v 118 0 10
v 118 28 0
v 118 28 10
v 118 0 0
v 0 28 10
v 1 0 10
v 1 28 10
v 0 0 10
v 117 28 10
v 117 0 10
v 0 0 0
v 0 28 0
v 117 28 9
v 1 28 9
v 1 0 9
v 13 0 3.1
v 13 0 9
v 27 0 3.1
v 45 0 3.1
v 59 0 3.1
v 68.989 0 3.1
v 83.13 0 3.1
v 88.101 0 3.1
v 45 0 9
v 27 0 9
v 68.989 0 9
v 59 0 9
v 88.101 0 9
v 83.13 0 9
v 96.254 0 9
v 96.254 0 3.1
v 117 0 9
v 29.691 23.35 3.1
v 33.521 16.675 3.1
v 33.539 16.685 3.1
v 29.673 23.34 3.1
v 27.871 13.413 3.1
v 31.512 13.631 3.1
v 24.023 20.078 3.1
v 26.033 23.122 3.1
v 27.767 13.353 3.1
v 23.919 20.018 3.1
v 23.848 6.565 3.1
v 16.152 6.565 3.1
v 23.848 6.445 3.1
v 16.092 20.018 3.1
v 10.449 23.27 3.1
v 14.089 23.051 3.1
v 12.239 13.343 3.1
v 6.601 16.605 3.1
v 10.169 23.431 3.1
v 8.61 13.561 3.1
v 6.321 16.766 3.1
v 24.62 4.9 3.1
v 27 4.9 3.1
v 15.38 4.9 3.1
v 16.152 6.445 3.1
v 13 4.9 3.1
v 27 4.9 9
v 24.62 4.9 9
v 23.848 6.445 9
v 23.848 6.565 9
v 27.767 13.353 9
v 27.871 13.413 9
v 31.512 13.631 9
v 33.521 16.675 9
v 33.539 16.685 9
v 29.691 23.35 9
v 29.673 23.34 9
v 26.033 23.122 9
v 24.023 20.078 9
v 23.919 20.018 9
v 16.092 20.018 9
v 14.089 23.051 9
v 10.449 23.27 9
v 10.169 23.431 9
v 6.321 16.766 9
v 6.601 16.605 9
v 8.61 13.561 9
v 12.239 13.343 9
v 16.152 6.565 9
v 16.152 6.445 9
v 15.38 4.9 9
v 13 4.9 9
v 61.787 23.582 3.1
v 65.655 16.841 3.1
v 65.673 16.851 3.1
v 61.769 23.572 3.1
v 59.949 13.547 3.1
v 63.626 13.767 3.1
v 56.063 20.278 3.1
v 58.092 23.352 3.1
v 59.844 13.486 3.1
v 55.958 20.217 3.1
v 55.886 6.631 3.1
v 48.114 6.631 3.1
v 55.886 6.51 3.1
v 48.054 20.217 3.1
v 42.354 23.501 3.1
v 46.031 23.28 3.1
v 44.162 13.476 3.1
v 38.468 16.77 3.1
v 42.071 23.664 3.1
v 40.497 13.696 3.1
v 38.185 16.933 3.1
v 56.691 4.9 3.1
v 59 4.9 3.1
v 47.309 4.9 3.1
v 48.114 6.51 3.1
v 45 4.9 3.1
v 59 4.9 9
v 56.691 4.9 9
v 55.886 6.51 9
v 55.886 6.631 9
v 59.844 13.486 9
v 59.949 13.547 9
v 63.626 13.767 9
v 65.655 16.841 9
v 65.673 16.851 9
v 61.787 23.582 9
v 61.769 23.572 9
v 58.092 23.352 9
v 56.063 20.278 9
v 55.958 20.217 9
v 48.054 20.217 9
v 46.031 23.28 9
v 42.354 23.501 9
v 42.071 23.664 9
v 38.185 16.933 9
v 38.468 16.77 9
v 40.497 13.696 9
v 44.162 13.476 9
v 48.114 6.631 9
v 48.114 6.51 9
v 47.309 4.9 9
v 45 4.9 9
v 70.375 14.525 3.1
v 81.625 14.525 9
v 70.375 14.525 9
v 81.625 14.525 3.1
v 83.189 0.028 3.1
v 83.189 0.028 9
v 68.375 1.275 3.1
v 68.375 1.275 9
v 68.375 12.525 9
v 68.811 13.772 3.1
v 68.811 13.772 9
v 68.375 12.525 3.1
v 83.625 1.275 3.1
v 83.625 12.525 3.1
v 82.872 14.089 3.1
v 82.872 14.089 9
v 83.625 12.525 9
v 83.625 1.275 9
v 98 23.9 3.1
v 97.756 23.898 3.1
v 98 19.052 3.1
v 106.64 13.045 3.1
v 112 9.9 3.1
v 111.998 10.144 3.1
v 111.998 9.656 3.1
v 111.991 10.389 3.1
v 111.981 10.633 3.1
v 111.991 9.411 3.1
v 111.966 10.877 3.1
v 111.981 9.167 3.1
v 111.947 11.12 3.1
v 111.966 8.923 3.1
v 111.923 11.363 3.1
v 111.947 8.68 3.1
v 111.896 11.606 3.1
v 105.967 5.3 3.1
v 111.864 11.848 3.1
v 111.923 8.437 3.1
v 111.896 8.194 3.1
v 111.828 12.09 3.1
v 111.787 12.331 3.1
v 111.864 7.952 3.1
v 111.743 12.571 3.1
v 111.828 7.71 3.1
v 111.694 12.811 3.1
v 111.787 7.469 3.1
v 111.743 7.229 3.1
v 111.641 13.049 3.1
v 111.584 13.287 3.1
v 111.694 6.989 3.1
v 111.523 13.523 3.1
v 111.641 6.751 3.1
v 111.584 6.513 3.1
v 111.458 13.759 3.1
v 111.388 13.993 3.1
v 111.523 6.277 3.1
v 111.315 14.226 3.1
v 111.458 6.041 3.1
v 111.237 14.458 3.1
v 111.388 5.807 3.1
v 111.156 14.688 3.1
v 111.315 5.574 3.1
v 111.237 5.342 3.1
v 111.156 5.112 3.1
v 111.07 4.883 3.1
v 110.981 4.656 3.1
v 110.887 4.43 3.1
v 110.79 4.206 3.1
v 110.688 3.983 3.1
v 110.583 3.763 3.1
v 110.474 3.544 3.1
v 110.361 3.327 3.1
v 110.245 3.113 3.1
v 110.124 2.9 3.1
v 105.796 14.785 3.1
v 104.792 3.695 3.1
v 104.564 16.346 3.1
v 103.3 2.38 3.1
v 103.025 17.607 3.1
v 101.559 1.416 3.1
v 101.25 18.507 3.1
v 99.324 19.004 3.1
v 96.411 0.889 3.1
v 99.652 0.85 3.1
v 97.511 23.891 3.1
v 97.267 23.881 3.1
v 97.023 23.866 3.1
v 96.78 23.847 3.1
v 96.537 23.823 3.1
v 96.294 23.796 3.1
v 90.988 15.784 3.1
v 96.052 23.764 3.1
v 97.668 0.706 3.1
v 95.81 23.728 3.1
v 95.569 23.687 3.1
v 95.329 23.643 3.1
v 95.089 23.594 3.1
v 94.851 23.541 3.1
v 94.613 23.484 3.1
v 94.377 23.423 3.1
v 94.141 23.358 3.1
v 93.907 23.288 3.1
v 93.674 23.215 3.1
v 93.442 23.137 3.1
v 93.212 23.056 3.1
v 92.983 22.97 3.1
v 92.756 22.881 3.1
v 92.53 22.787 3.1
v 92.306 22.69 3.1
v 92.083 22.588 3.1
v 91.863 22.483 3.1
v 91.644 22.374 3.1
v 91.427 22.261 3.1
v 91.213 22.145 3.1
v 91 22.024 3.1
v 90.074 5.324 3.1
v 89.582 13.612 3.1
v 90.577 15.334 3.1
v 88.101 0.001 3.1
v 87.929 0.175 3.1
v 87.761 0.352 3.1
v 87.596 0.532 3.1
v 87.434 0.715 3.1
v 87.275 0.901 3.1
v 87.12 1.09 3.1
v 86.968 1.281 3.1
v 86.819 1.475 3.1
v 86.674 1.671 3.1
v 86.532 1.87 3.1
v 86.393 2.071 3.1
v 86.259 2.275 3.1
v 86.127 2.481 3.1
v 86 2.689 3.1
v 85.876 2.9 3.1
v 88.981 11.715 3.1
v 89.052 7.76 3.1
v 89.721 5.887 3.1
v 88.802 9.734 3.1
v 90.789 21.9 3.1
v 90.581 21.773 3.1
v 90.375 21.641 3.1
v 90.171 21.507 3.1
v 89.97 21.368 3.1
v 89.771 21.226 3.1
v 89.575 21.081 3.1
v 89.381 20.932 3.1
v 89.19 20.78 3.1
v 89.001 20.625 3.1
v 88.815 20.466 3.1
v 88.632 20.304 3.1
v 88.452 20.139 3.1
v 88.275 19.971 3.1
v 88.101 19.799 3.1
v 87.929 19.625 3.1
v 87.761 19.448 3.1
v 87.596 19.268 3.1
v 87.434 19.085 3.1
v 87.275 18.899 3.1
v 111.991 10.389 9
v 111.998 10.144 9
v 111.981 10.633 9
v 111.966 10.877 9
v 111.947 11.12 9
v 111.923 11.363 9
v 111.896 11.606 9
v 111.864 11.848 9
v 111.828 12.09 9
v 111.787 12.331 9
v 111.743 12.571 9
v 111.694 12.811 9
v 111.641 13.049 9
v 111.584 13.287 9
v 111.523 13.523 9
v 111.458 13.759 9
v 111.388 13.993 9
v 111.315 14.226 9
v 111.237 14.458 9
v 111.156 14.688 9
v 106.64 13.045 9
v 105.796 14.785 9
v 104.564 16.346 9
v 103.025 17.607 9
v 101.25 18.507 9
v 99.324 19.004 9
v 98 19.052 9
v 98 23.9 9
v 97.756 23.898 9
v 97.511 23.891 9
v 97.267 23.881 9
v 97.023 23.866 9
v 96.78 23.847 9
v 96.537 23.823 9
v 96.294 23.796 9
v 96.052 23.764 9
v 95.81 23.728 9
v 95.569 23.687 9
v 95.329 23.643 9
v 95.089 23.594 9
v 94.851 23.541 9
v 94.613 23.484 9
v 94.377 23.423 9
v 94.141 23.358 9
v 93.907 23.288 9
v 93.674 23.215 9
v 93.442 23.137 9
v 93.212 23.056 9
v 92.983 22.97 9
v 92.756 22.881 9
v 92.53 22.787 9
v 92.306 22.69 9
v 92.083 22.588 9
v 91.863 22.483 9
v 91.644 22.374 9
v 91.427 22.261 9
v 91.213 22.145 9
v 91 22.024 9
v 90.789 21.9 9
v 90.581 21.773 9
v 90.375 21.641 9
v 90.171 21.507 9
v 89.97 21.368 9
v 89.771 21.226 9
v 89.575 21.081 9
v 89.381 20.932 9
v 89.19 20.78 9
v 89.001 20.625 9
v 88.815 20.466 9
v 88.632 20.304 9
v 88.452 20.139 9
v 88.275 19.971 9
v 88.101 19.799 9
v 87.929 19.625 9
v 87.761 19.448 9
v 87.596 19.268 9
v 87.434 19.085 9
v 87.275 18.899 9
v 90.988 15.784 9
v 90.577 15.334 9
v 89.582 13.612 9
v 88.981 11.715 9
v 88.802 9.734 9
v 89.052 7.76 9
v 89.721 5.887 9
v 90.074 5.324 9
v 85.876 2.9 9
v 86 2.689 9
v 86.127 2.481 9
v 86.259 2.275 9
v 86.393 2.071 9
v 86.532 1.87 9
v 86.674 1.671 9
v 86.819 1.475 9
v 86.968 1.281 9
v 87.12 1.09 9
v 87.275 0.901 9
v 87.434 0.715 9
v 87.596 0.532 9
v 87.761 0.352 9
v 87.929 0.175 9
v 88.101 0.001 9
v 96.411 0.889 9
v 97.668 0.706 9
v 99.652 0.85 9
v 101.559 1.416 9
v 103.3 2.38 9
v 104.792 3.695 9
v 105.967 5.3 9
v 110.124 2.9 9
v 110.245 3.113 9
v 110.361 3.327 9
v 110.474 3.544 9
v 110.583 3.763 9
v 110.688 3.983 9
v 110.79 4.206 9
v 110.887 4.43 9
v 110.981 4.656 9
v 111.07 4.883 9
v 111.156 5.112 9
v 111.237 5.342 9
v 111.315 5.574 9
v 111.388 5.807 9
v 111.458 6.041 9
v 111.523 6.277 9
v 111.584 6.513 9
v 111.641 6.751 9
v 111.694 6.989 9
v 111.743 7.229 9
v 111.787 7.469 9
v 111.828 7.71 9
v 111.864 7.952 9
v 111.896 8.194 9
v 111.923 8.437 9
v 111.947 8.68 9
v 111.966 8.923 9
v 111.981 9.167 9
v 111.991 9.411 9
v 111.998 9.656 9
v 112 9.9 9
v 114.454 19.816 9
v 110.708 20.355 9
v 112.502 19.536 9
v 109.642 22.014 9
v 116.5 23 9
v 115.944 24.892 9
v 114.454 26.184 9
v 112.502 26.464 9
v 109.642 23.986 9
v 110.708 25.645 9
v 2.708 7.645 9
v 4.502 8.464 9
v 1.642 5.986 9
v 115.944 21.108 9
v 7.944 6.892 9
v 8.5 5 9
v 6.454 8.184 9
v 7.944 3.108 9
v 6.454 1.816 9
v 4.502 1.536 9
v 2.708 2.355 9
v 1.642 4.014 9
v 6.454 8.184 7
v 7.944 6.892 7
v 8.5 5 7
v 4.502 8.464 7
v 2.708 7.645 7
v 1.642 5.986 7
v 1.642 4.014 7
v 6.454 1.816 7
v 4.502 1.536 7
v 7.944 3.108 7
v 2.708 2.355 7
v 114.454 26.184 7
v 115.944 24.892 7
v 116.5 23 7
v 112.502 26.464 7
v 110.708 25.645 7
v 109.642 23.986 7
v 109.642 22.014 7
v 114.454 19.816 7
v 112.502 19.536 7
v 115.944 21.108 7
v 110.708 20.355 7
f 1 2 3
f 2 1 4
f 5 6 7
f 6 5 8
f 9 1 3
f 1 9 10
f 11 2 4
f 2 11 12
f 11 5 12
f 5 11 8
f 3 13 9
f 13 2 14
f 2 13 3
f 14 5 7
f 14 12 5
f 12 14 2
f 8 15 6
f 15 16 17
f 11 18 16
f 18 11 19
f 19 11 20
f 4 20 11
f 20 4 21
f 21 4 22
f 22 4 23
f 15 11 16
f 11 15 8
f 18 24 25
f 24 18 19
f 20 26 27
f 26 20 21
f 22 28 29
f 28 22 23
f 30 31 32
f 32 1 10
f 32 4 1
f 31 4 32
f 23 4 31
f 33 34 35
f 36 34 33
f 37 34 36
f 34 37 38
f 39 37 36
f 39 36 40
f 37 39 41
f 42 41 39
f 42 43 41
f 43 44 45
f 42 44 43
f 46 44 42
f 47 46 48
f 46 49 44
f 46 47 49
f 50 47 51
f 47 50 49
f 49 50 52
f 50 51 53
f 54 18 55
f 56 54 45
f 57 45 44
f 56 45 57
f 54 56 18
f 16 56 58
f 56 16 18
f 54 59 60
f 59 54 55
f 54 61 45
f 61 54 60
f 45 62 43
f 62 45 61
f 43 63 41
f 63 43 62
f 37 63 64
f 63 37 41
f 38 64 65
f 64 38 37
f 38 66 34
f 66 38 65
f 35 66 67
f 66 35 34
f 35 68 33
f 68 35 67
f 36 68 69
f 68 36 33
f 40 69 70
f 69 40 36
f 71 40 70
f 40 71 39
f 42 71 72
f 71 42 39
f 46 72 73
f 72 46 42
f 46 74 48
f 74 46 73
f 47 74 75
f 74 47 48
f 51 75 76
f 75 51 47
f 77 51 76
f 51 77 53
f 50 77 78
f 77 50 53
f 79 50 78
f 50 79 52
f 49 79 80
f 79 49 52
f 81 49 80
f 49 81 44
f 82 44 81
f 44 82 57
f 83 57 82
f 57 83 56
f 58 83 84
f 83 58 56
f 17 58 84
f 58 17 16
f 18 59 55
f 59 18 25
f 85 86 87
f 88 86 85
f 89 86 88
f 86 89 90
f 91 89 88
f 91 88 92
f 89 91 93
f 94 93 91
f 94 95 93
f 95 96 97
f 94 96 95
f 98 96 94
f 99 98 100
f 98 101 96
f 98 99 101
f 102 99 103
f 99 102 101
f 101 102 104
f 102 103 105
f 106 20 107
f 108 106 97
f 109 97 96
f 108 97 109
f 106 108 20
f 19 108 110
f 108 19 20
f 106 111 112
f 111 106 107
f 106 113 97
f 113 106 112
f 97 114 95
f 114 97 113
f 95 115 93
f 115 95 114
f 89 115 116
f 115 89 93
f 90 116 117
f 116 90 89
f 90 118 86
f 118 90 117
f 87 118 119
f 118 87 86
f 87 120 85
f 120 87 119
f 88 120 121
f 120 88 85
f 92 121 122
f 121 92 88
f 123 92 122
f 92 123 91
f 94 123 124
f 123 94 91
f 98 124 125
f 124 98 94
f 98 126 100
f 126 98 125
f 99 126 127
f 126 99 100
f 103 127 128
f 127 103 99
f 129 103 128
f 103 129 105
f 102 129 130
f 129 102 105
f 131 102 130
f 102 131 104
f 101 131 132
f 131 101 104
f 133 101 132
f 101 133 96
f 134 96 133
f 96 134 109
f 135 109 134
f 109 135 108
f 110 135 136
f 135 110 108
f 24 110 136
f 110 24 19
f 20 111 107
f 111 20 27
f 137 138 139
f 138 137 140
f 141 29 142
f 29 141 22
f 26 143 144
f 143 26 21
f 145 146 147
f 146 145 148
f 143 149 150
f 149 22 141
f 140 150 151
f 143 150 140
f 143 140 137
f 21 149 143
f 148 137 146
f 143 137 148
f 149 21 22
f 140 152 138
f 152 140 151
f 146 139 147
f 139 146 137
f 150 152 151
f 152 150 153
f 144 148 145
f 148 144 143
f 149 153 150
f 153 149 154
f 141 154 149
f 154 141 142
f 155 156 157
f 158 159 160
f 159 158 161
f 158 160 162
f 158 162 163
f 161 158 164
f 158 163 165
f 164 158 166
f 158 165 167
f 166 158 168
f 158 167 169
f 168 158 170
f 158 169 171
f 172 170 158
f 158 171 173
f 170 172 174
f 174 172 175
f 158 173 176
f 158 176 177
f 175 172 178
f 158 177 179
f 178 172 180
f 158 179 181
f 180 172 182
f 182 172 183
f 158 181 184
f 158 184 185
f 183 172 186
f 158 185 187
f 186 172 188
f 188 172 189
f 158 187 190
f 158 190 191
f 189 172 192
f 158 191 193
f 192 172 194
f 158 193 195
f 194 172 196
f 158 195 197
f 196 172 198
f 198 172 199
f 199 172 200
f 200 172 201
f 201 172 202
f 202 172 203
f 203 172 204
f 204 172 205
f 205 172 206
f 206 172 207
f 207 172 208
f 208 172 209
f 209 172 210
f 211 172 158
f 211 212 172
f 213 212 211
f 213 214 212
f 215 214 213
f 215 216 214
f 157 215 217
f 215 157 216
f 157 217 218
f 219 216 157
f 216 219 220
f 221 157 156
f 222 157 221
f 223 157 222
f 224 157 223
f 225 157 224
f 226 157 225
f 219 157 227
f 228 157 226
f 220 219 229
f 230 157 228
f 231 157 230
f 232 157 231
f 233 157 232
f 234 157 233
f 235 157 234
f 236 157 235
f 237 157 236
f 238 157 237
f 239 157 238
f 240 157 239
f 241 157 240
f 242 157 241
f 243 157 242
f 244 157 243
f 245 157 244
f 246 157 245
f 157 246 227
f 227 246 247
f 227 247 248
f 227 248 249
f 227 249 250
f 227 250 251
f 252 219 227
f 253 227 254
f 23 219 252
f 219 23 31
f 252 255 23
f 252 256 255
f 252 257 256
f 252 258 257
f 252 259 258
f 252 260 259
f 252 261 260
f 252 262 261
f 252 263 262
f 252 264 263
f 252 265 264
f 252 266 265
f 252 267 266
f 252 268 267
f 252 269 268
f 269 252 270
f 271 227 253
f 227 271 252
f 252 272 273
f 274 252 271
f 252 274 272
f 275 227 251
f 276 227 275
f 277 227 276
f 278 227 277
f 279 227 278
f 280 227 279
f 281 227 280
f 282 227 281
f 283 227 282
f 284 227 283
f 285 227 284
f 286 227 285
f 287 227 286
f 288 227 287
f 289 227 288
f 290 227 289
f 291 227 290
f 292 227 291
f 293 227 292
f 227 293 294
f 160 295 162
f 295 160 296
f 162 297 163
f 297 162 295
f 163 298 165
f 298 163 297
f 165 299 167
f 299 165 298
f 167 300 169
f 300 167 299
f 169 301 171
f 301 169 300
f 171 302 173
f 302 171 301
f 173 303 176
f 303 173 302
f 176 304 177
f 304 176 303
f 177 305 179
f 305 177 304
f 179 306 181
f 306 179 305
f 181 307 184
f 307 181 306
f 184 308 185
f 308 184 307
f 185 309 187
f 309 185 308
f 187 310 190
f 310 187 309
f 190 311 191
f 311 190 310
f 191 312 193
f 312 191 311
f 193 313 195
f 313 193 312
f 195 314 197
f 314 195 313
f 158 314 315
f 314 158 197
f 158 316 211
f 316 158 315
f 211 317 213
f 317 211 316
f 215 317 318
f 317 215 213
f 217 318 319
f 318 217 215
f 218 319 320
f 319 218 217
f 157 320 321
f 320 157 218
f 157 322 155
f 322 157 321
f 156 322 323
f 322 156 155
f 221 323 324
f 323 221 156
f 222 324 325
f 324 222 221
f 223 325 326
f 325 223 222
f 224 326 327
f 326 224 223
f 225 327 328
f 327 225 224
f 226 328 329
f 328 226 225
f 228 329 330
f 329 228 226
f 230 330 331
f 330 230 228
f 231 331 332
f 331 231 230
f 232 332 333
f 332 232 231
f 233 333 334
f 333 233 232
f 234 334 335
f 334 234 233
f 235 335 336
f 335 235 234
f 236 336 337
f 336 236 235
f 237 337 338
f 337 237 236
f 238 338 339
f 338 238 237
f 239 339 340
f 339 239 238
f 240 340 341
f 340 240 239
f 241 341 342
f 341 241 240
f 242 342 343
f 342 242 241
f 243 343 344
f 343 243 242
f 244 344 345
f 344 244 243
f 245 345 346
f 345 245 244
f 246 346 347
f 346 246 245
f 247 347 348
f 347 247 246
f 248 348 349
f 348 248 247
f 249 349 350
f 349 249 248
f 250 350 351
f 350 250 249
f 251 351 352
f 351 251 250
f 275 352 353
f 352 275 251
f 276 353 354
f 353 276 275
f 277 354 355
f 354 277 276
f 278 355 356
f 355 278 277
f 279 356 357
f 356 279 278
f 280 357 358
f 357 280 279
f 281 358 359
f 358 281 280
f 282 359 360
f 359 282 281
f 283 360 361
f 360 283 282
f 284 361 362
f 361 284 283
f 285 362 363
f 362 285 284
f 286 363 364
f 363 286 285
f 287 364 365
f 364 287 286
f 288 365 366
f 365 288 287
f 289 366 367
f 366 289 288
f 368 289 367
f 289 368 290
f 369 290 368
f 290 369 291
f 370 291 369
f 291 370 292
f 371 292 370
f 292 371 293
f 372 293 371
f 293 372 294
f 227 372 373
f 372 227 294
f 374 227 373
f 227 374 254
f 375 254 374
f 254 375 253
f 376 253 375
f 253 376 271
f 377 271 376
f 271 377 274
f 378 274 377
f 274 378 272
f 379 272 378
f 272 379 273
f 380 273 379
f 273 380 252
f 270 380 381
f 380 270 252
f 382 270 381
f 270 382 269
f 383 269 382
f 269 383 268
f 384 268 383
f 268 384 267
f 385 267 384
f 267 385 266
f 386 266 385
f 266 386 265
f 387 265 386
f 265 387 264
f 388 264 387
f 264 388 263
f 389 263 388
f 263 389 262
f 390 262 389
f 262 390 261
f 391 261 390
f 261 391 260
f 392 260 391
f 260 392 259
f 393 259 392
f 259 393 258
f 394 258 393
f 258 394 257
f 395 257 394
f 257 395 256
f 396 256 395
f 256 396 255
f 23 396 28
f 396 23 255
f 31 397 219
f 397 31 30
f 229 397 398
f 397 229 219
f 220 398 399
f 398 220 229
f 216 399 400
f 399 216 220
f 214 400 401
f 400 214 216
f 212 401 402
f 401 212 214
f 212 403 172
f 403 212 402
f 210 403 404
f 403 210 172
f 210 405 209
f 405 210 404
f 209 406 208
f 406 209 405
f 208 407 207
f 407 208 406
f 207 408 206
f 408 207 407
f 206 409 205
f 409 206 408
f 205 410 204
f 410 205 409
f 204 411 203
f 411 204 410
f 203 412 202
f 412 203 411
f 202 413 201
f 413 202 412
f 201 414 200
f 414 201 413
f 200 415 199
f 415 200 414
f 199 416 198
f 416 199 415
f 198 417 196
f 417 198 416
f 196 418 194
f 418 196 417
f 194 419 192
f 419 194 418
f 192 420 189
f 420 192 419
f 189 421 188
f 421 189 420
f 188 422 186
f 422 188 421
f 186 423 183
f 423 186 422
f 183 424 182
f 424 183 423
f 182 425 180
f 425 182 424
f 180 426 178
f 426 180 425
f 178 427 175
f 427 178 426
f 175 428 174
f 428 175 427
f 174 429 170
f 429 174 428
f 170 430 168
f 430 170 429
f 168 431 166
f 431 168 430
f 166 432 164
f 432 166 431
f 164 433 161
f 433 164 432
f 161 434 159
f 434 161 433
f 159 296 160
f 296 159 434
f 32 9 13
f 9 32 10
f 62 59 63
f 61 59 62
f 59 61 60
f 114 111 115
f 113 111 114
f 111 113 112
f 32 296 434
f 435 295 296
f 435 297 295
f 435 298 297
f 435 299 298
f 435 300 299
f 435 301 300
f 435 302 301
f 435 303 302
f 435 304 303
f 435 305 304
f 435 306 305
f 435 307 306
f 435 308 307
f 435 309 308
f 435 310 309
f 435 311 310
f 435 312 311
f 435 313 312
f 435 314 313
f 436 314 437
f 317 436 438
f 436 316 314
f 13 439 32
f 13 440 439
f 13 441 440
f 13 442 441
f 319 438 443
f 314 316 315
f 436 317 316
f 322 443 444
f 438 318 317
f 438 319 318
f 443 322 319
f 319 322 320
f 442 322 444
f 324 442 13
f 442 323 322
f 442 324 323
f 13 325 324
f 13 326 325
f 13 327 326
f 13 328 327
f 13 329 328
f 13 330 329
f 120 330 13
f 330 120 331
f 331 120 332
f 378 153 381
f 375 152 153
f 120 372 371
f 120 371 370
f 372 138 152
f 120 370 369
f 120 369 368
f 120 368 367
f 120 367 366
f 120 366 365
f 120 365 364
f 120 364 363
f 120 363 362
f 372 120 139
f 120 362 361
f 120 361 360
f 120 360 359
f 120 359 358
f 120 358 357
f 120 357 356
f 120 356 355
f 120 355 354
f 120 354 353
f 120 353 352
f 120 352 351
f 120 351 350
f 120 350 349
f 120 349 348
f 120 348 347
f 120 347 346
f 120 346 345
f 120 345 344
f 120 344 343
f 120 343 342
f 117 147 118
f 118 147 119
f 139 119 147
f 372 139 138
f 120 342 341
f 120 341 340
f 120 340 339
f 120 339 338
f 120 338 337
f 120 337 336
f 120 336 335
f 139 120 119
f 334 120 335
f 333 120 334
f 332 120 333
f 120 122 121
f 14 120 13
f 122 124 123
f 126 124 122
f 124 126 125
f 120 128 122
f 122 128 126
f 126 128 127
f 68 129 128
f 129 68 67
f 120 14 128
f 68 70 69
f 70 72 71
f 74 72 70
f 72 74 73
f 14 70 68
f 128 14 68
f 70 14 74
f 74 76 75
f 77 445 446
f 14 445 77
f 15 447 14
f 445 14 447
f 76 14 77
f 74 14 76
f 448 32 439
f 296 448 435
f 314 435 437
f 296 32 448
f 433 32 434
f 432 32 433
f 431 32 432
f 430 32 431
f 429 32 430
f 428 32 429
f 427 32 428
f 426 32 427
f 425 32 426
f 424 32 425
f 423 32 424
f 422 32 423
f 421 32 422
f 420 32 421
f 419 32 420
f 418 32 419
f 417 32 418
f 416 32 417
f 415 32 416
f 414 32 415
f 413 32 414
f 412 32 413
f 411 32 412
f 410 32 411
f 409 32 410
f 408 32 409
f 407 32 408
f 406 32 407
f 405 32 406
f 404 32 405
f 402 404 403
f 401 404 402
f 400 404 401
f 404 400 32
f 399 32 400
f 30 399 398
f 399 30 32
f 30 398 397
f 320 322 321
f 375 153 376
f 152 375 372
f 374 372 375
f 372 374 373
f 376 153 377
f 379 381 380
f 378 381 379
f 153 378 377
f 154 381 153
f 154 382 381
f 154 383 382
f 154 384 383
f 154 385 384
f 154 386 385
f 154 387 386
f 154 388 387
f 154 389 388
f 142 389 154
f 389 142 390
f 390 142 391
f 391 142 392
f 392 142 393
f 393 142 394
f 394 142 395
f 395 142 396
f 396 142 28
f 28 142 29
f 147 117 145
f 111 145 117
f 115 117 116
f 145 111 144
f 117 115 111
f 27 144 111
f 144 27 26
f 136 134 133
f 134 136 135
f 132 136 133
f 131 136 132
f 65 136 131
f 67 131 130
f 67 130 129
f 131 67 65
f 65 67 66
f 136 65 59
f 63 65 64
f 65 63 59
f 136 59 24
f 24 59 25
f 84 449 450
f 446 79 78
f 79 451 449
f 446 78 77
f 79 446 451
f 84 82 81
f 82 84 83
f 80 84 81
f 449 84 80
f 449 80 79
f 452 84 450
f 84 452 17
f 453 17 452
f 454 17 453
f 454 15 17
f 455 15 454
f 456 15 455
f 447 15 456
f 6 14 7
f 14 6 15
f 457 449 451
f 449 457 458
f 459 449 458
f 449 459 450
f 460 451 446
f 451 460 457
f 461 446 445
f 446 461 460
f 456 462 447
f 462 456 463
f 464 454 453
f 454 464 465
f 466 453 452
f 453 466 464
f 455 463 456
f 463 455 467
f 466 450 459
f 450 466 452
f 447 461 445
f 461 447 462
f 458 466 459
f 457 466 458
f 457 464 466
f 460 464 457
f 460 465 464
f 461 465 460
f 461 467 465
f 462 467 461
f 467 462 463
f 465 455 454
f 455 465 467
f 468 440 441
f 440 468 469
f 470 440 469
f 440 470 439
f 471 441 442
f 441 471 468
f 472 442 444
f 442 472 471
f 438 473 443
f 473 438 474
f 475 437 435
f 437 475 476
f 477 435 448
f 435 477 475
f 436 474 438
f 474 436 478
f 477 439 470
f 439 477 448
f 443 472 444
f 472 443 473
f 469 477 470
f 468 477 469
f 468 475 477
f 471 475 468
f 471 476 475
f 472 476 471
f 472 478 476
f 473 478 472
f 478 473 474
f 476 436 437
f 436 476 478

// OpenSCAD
// file: Token_Shapes.scad
ion_tri_length = 6.5;
niblet_length = 3.8;
module ion_tri_piece_1 () {
    translate([2, niblet_length, 0]){
       polygon(points=[
        [0, 0],        // Point A
        [ion_tri_length, 0],        // Point B
        [ion_tri_length/2, ion_tri_length/4]       // Point C
    ]); 
    }
}
module ion_point_niblet(){
    ion_tri_piece_1();
    mirror([0, 1, 0]){
        ion_tri_piece_1();
    }
    translate([2, -(niblet_length+0.01), 0]){
        square([ion_tri_length+0.3,((niblet_length * 2) + 0.02)]); //0.2 used here to connect triangles to square
    }    
}

module create_ion_token(ion_scale=[1.03,1.03]){
    // ion Side length
    s = 23;
    // Height of ion equilateral triangle
    h = s * sqrt(3) / 2;
    //Start of the ion token creation. No, it can't be refactored
    scale(ion_scale)union(){
        translate([0,(h/3)*2,0]){
            rotate([0,0,60]){
                translate([0,(h/3),0]){
                    union(){
                        translate([0,-(h/3)*1,0]){
                            rotate([0,0,60]){
                                translate([0,-((h/3)*2),0]){
                                    union(){
                                        //first niblet
                                        translate([0,-2,0]){
                                            rotate([0,0,90]){
                                                ion_point_niblet();
                                            }
                                        }
                                        
                                        //ion token base
                                        //rotate so we can align the niblets
                                        rotate([0,0,60]){ 
                                            polygon(points=[
                                            [0, 0],        // Point A
                                            [s, 0],        // Point B
                                            [s/2, h]       // Point C
                                            ]);
                                        }
                                    }
                                }
                            }
                        }
                        //second niblet
                        translate([0,-2,0]){
                            rotate([0,0,90]){
                                ion_point_niblet();
                            }
                        }
                    }
                }
            }
        }
        //third niblet
        translate([0,-2,0]){
            rotate([0,0,90]){
                ion_point_niblet();
            }
        }
    }
}

module create_surge_token(){
    size = 15.25;     // square side length (mm)
    radius = 2;    // corner radius (mm)

    offset(r = radius)
    square(size - 2*radius, center=true);
}

module obs_arrow(){
    radius = 14;
    angle = 50;   // degrees

    polygon(points = concat(
        [[0,0]],
        [ for (a = [0:1:angle])
            [ radius * cos(a), radius * sin(a) ]
        ]
    ));
}
//observation token
module create_observation_token(){
    union(){
    obs_arrow();
    rotate([0,0,120]){
        union(){
            obs_arrow();
            rotate([0,0,120]){
                union(){
                    circle(r=9.20);
                    obs_arrow();
                    }
                }
            }
        }
    }
}
// main file
//For testing individual pockets
use <Token_Shapes.scad>;

// Box dimensions
box_x = 118;
box_y = 28;
box_z = 10;

// Pocket dimensions
pocket_radius = 21;
pocket_depth  = box_z-3;

ion_x_wall = 20;
ion_y_wall = 0;

surge_x_wall = 76;
surge_y_wall = 7;

obs_x_wall = 98;
obs_y_wall = 10;

//6mmx2mm
magnet_d = 7;
magnet_h = 2;

difference() {
    // Outer box
    cube([box_x, box_y, box_z]);
    
    //ion token pocket
    translate([ion_x_wall,ion_y_wall-0.1,box_z+0.1- pocket_depth]){
        linear_extrude(height=pocket_depth){
            create_ion_token(ion_scale=[1.01,1.01]);
            translate([-7,0])square([14,5]); //extra cutout for ion
        }    
    }
    //ion token pocket
    translate([ion_x_wall+32,ion_y_wall-0.1,box_z+0.1- pocket_depth]){
        linear_extrude(height=pocket_depth){
            create_ion_token(ion_scale=[1.02,1.02]);
            translate([-7,0])square([14,5]); //extra cutout for ion
        }    
    }
    
    //Create surge token
    translate([surge_x_wall,surge_y_wall-0.1,box_z+0.1- pocket_depth]){
        linear_extrude(height=pocket_depth){
            create_surge_token();
            //translate([-6,5])square([12,5]);
        }    
    }
    
    //Create observation token
    translate([obs_x_wall,obs_y_wall-0.1,box_z+0.1- pocket_depth]){
        linear_extrude(height=pocket_depth){
            rotate([0,0,90])create_observation_token();
            //translate([-6,5])square([12,5]);
        }    
    }
    
    //Create a cut for the lip
    lip_cut = 2;
    translate([1, -1, box_z-1])cube([box_x-lip_cut, box_y+2, 2]);
    
    color("red")translate([5, 5, box_z-lip_cut-1])cylinder(h=magnet_h+2, d=magnet_d);
    color("red")translate([box_x-5, box_y-5, box_z-lip_cut-1])cylinder(h=magnet_h+2, d=magnet_d);
    
}
//color("red")translate([1, 0, box_z-1])cube([box_x-2, box_y, 2]);
